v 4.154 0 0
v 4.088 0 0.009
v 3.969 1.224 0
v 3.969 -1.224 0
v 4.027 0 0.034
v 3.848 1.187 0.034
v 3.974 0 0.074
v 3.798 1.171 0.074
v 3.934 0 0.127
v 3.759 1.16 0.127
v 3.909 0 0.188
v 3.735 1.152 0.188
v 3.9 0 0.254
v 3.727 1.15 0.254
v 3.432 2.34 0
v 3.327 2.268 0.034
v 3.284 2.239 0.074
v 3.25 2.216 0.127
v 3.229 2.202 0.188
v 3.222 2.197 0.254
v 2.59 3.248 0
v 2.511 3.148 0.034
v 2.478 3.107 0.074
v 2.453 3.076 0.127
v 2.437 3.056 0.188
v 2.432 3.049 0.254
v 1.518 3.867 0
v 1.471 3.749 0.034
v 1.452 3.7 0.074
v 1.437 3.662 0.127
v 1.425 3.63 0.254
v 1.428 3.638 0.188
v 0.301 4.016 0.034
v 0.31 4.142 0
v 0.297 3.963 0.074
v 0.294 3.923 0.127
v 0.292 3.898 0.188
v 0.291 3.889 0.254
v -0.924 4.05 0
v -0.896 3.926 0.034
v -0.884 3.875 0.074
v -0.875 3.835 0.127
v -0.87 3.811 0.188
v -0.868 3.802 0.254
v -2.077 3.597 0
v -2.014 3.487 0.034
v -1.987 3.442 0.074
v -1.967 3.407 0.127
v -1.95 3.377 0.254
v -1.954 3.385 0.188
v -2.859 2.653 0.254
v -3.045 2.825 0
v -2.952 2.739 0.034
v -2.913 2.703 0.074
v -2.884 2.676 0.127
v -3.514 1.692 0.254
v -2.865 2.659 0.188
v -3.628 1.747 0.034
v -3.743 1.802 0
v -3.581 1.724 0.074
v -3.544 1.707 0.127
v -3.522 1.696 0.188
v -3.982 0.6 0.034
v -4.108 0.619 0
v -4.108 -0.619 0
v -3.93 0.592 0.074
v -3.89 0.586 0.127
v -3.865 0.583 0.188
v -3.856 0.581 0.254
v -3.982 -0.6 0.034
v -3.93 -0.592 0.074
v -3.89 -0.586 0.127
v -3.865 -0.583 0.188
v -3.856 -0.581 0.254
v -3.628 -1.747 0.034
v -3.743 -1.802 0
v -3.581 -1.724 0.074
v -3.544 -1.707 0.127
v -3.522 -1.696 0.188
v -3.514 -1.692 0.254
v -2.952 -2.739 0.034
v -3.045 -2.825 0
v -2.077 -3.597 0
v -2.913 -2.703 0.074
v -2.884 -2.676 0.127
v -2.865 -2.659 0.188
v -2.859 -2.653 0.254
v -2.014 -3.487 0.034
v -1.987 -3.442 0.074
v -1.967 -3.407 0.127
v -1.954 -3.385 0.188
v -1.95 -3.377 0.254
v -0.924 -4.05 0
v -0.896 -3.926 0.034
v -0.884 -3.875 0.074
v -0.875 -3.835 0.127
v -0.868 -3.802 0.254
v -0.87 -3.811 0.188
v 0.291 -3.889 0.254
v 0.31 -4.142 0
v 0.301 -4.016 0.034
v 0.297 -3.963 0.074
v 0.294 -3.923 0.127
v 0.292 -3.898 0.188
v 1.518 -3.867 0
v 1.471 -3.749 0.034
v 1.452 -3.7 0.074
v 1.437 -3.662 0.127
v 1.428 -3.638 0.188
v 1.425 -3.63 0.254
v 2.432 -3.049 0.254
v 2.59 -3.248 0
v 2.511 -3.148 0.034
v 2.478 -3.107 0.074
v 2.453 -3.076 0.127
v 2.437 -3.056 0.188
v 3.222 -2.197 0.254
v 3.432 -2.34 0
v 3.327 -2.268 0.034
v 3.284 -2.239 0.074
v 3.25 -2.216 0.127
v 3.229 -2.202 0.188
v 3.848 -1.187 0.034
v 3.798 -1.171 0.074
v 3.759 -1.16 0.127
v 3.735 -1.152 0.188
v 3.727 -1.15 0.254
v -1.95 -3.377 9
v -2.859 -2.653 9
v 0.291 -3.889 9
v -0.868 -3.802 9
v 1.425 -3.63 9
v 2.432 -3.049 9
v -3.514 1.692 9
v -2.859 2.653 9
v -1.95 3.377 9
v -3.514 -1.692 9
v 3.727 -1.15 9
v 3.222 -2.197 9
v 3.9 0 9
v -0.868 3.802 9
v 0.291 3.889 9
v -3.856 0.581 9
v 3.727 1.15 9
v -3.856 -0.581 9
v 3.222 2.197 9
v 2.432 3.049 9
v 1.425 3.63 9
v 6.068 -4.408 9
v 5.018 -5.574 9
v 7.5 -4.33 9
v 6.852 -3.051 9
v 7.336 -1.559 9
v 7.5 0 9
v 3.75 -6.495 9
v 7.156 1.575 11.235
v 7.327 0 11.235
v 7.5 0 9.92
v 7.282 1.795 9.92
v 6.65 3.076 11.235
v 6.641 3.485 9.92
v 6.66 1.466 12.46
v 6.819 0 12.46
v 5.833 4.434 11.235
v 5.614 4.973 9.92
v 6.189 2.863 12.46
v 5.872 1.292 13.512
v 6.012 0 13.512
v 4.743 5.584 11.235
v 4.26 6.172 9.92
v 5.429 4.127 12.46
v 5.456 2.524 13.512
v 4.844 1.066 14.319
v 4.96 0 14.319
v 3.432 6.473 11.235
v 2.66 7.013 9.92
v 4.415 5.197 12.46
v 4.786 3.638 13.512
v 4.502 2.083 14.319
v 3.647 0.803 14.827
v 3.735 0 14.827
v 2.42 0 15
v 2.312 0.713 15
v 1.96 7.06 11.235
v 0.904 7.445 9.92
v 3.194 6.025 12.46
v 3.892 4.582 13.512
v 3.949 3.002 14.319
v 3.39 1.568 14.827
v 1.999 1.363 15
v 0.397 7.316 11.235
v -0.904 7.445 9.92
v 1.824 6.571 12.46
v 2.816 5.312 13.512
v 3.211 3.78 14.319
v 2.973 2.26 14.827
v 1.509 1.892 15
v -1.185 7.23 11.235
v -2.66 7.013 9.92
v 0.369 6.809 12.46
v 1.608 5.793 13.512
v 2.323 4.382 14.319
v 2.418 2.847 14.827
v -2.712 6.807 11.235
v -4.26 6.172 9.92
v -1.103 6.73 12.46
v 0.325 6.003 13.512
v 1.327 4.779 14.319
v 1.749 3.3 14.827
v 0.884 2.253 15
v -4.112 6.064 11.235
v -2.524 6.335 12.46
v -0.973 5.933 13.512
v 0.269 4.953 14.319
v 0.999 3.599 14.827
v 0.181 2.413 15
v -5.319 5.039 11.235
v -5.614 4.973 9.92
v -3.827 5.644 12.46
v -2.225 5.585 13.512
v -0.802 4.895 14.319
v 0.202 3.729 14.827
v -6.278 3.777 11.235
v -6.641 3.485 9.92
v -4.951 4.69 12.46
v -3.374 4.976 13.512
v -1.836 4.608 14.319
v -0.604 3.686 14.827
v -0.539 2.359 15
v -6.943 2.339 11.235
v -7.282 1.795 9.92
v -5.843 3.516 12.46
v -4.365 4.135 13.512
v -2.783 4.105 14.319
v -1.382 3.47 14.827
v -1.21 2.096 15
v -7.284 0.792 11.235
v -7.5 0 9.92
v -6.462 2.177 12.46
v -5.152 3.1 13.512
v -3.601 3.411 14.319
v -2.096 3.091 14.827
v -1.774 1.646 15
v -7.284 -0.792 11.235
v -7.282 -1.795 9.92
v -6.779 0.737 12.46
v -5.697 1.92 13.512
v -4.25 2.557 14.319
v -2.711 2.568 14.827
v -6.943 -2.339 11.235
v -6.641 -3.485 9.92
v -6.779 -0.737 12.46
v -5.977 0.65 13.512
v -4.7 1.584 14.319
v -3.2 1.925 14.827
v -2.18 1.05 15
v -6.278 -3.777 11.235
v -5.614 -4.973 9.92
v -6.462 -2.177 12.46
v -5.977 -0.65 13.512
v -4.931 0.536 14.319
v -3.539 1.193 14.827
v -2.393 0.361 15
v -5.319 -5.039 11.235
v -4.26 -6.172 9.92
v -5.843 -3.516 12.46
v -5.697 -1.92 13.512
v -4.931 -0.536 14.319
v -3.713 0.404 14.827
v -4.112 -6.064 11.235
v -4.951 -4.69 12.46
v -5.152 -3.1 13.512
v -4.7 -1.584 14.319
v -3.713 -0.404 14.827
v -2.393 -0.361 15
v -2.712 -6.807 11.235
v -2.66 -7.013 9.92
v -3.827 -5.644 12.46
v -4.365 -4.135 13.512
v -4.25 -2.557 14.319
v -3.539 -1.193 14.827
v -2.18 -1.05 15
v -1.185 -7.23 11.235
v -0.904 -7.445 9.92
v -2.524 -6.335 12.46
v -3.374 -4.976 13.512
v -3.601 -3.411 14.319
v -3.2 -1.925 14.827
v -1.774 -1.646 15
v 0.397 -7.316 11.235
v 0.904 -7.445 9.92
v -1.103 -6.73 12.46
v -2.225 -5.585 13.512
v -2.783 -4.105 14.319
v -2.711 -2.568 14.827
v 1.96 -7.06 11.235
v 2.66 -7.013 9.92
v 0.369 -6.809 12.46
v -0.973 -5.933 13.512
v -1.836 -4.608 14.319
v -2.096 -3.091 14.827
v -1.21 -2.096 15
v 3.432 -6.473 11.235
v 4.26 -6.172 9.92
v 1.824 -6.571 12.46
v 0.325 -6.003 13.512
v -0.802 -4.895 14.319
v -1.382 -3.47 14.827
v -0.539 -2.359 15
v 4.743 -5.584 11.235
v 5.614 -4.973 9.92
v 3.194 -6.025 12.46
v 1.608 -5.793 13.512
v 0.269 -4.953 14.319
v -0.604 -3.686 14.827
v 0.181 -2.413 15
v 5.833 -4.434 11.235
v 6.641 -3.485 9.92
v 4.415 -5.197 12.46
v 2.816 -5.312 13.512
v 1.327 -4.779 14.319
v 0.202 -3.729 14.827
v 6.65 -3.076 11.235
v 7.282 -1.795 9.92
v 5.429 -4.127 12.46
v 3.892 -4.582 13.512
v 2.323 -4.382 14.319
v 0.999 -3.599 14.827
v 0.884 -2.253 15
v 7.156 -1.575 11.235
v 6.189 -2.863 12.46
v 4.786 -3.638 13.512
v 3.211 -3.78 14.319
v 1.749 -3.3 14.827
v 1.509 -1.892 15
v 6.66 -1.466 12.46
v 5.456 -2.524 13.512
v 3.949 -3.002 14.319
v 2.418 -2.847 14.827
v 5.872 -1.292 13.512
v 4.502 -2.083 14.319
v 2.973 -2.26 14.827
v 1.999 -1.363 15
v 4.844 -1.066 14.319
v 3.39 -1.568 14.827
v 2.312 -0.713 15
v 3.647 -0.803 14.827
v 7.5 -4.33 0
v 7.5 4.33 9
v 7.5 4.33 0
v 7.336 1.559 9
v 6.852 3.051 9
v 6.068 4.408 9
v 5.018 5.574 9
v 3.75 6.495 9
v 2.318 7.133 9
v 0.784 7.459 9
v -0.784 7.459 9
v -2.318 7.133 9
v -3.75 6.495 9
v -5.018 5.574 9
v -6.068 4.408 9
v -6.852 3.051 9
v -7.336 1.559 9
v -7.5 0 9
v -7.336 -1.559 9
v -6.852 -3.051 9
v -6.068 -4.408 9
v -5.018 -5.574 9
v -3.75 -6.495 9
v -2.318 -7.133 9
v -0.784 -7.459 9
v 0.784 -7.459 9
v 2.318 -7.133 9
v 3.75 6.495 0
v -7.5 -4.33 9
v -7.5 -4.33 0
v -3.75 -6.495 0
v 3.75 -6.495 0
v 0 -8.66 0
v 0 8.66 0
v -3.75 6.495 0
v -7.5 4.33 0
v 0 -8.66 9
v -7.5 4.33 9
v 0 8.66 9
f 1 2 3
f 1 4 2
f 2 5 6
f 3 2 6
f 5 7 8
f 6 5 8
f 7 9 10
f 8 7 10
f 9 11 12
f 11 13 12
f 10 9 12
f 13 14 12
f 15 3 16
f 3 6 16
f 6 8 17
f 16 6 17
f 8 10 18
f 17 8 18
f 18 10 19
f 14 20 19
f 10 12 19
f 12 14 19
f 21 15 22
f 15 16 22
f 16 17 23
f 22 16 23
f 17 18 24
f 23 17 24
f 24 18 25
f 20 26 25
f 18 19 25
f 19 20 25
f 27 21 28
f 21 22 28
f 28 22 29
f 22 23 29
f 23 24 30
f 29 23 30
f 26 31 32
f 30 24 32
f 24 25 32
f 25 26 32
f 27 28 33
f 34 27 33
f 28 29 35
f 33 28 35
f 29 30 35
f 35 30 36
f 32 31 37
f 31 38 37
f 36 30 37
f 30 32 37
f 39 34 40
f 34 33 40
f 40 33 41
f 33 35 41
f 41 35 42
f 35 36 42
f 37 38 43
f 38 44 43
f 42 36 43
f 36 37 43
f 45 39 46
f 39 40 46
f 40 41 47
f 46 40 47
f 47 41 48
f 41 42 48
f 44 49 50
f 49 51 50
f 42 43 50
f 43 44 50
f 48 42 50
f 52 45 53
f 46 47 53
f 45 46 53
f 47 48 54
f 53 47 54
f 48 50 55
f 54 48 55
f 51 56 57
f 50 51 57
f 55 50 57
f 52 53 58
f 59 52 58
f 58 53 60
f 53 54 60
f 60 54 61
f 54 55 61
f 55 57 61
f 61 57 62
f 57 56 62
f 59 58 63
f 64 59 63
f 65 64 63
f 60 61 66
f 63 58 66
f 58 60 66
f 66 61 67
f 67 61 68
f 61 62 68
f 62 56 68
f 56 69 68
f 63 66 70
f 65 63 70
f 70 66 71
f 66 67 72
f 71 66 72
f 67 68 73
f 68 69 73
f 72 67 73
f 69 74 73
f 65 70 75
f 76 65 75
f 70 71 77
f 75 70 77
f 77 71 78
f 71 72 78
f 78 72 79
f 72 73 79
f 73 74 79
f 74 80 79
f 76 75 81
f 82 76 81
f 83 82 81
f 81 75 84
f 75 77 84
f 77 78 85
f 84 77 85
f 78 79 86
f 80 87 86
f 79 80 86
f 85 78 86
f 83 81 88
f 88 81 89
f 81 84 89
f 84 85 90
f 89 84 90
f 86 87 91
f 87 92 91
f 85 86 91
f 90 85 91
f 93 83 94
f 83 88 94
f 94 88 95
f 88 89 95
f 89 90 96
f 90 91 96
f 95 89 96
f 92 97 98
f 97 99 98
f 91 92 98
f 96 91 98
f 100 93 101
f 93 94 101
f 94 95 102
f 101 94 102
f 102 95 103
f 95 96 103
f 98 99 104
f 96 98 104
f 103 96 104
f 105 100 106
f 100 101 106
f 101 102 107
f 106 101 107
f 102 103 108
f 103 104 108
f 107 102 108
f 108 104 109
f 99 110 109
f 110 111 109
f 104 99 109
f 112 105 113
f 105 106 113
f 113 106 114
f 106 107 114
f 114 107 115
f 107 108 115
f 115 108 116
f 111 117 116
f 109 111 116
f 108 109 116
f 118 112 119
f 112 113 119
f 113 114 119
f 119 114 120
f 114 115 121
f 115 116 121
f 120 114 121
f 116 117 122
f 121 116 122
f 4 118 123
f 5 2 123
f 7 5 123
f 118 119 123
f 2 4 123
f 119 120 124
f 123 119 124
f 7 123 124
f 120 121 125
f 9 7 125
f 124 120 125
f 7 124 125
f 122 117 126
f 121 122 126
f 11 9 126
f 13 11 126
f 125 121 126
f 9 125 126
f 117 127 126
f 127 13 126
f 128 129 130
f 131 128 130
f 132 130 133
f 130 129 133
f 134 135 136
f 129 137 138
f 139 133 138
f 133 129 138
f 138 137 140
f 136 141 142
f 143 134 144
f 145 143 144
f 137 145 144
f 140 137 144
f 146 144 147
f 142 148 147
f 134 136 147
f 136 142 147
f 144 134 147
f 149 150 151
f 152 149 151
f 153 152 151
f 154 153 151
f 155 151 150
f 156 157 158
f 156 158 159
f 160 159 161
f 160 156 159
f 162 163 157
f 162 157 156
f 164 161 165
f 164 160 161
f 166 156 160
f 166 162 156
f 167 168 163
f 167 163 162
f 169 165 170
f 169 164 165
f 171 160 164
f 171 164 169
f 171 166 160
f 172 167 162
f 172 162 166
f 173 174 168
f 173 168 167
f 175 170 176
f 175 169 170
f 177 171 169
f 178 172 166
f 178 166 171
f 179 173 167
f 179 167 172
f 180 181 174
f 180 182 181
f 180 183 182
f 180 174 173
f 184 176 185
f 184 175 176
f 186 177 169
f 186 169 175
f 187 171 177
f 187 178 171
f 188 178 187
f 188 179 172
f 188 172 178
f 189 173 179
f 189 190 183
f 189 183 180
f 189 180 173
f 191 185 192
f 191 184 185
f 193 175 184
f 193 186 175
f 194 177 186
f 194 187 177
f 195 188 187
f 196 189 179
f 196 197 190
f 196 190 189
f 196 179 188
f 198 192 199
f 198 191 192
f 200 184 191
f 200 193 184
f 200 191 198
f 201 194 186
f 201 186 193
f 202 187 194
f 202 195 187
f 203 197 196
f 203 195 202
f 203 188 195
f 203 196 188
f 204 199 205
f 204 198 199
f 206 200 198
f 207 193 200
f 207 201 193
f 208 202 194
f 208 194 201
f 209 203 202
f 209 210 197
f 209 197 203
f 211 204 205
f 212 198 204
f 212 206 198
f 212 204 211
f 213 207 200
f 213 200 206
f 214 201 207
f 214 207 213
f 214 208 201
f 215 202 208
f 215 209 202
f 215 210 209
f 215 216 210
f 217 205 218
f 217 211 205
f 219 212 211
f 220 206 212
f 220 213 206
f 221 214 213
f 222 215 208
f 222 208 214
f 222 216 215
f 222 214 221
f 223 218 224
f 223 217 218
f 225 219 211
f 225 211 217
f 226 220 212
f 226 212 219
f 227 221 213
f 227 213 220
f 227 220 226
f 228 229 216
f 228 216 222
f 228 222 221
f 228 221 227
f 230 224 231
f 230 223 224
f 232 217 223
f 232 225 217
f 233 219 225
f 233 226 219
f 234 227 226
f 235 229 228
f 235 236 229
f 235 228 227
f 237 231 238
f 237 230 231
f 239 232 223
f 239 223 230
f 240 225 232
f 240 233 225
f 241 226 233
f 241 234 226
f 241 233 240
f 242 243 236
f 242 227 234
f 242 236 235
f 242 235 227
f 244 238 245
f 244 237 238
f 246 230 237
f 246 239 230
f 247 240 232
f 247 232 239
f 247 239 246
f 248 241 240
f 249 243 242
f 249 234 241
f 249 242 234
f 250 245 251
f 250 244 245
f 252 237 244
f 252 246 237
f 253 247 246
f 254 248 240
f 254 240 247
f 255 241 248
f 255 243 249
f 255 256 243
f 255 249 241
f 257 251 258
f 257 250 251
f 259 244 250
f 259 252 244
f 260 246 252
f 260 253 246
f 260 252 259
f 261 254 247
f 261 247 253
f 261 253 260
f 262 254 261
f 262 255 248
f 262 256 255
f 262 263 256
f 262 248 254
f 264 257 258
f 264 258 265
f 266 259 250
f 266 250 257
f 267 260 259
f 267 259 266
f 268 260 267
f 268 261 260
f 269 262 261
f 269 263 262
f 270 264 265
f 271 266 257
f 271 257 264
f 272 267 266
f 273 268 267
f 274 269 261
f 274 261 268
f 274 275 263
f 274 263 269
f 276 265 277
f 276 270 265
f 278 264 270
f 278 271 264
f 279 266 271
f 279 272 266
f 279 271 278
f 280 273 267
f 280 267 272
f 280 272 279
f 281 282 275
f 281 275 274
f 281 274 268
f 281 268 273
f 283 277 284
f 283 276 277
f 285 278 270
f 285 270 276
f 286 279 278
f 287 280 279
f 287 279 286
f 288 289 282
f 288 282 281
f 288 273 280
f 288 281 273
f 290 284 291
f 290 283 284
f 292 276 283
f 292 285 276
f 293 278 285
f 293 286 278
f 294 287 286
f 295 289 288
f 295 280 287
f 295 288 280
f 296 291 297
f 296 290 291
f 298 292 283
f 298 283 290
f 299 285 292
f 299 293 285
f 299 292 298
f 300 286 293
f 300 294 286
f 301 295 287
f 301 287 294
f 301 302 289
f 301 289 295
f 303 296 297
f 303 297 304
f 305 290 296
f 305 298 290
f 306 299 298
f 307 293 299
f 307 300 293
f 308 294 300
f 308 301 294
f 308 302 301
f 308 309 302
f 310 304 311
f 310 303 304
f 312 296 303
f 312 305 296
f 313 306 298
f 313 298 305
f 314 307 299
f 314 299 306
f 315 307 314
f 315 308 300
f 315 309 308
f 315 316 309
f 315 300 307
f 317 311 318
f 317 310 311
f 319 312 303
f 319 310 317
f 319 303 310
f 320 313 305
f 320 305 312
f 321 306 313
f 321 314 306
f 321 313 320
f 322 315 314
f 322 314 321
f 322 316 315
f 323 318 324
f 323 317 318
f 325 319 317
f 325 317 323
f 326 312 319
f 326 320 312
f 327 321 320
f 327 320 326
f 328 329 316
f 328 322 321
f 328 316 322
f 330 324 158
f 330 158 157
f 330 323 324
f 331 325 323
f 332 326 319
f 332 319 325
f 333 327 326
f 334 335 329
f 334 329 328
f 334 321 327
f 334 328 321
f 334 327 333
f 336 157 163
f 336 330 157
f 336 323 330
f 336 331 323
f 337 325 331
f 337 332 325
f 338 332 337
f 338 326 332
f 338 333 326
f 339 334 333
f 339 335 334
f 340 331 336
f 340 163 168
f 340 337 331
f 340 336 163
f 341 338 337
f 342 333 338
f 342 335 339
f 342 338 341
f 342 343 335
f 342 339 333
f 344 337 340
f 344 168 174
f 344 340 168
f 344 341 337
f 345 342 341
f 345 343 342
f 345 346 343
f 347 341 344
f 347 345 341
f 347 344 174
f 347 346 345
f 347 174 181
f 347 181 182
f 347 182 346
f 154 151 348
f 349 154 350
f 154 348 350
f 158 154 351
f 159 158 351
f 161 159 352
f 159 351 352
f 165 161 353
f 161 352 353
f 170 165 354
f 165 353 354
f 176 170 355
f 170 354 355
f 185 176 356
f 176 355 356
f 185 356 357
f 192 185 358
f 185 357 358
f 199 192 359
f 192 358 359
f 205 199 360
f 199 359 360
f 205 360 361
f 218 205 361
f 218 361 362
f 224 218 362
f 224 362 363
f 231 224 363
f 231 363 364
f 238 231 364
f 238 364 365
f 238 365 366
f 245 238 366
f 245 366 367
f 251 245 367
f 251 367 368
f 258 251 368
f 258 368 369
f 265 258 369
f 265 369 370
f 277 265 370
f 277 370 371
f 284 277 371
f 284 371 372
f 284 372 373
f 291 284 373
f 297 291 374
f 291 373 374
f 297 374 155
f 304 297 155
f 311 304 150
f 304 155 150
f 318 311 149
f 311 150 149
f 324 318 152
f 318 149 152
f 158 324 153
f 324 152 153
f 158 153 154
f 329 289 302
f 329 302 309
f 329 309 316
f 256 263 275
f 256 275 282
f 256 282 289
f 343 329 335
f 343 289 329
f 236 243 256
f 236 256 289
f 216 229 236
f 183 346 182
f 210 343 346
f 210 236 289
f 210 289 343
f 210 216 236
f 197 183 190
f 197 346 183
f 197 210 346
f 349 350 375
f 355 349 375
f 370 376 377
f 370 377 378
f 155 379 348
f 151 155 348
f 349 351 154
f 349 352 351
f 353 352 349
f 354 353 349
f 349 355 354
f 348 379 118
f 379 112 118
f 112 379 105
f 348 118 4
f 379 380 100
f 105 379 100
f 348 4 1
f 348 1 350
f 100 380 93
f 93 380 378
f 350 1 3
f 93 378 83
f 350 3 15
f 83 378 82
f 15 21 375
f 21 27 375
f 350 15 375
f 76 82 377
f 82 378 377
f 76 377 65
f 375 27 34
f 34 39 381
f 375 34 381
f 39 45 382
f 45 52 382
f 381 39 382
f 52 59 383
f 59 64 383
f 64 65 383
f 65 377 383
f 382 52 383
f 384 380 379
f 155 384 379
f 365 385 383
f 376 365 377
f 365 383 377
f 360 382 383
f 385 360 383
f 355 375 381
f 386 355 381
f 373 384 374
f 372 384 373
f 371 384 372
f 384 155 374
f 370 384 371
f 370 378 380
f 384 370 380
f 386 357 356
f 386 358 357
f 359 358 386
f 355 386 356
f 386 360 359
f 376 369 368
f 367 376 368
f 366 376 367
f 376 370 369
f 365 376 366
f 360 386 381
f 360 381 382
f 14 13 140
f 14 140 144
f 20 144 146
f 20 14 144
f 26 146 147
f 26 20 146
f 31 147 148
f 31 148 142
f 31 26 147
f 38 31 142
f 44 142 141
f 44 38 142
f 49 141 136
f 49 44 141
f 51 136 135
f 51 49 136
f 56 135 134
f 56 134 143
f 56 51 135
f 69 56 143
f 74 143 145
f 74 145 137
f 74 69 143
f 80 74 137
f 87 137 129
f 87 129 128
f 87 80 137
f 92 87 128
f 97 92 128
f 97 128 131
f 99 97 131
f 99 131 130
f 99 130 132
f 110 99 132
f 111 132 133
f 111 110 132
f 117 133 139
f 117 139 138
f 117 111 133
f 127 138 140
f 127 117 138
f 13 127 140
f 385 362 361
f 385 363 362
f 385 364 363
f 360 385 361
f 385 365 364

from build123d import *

# Parameters (mm, degrees)
SKETCH1_R           = 7.5
SKETCH1_R_2         = 3.9
BOSS_EXTRUDE1_DEPTH = 9
SKETCH2_R           = 7.5
BOSS_EXTRUDE2_DEPTH = 6
FILLET1_R           = 5.08
FILLET2_R           = 0.254


with BuildPart() as part:
    # Sketch1 → Boss-Extrude1 (new body)
    # profile 1 of 7: a face of its own
    with BuildSketch(Plane(origin=(0, 0, 0), x_dir=(0, 1, 0), z_dir=(0, 0, 1))):
        with BuildLine():
            ThreePointArc((-6.495190512, 3.750000029), (-3.749999976, 6.495190542), (2.2e-08, 7.5))
            Line((2.2e-08, 7.5), (-4.330127019, 7.5))
            Line((-4.330127019, 7.5), (-6.495190512, 3.750000029))
        make_face()
    # profile 2 of 7: a face of its own
    with BuildSketch(Plane(origin=(0, 0, 0), x_dir=(0, 1, 0), z_dir=(0, 0, 1))):
        Circle(SKETCH1_R)
        with Locations(Location((0, 0, 0), (0, 0, 270))):
            Circle(SKETCH1_R_2, mode=Mode.SUBTRACT)
    # profile 3 of 7: a face of its own
    with BuildSketch(Plane(origin=(0, 0, 0), x_dir=(0, 1, 0), z_dir=(0, 0, 1))):
        with BuildLine():
            ThreePointArc((2.2e-08, 7.5), (3.749999991, 6.495190533), (6.495190507, 3.750000037))
            Line((6.495190507, 3.750000037), (4.330127019, 7.5))
            Line((4.330127019, 7.5), (2.2e-08, 7.5))
        make_face()
    # profile 4 of 7: a face of its own
    with BuildSketch(Plane(origin=(0, 0, 0), x_dir=(0, 1, 0), z_dir=(0, 0, 1))):
        with BuildLine():
            ThreePointArc((-6.495190559, -3.749999947), (-7.5, 4.7e-08), (-6.495190512, 3.750000029))
            Line((-6.495190512, 3.750000029), (-8.660254038, 0))
            Line((-8.660254038, 0), (-6.495190559, -3.749999947))
        make_face()
    # profile 5 of 7: a face of its own
    with BuildSketch(Plane(origin=(0, 0, 0), x_dir=(0, 1, 0), z_dir=(0, 0, 1))):
        with BuildLine():
            Line((6.49519047, -3.750000102), (8.660254038, 0))
            Line((8.660254038, 0), (6.495190507, 3.750000037))
            ThreePointArc((6.495190507, 3.750000037), (7.244443692, 1.941142859), (7.5, 0))
            ThreePointArc((7.5, 0), (7.244443682, -1.941142895), (6.49519047, -3.750000102))
        make_face()
    # profile 6 of 7: a face of its own
    with BuildSketch(Plane(origin=(0, 0, 0), x_dir=(0, 1, 0), z_dir=(0, 0, 1))):
        with BuildLine():
            Line((4.330127019, -7.5), (6.49519047, -3.750000102))
            ThreePointArc((6.49519047, -3.750000102), (3.749999939, -6.495190564), (-2.3e-08, -7.5))
            Line((-2.3e-08, -7.5), (4.330127019, -7.5))
        make_face()
    # profile 7 of 7: a face of its own
    with BuildSketch(Plane(origin=(0, 0, 0), x_dir=(0, 1, 0), z_dir=(0, 0, 1))):
        with BuildLine():
            Line((-4.330127019, -7.5), (-2.3e-08, -7.5))
            ThreePointArc((-2.3e-08, -7.5), (-3.750000037, -6.495190507), (-6.495190559, -3.749999947))
            Line((-6.495190559, -3.749999947), (-4.330127019, -7.5))
        make_face()
    extrude(amount=BOSS_EXTRUDE1_DEPTH)

    # Sketch2 → Boss-Extrude2 (add)
    with BuildSketch(Plane.XY.offset(9)):
        Circle(SKETCH2_R)
    extrude(amount=BOSS_EXTRUDE2_DEPTH)

    # Fillet1
    fillet1_edges = [part.edges().sort_by_distance(p)[0] for p in [
        (-7.5, 0, 15),
    ]]
    fillet(fillet1_edges, radius=FILLET1_R)

    # Fillet2
    fillet2_edges = [part.edges().sort_by_distance(p)[0] for p in [
        (-3.9, 0, 0),
    ]]
    fillet(fillet2_edges, radius=FILLET2_R)


solid = part.part
